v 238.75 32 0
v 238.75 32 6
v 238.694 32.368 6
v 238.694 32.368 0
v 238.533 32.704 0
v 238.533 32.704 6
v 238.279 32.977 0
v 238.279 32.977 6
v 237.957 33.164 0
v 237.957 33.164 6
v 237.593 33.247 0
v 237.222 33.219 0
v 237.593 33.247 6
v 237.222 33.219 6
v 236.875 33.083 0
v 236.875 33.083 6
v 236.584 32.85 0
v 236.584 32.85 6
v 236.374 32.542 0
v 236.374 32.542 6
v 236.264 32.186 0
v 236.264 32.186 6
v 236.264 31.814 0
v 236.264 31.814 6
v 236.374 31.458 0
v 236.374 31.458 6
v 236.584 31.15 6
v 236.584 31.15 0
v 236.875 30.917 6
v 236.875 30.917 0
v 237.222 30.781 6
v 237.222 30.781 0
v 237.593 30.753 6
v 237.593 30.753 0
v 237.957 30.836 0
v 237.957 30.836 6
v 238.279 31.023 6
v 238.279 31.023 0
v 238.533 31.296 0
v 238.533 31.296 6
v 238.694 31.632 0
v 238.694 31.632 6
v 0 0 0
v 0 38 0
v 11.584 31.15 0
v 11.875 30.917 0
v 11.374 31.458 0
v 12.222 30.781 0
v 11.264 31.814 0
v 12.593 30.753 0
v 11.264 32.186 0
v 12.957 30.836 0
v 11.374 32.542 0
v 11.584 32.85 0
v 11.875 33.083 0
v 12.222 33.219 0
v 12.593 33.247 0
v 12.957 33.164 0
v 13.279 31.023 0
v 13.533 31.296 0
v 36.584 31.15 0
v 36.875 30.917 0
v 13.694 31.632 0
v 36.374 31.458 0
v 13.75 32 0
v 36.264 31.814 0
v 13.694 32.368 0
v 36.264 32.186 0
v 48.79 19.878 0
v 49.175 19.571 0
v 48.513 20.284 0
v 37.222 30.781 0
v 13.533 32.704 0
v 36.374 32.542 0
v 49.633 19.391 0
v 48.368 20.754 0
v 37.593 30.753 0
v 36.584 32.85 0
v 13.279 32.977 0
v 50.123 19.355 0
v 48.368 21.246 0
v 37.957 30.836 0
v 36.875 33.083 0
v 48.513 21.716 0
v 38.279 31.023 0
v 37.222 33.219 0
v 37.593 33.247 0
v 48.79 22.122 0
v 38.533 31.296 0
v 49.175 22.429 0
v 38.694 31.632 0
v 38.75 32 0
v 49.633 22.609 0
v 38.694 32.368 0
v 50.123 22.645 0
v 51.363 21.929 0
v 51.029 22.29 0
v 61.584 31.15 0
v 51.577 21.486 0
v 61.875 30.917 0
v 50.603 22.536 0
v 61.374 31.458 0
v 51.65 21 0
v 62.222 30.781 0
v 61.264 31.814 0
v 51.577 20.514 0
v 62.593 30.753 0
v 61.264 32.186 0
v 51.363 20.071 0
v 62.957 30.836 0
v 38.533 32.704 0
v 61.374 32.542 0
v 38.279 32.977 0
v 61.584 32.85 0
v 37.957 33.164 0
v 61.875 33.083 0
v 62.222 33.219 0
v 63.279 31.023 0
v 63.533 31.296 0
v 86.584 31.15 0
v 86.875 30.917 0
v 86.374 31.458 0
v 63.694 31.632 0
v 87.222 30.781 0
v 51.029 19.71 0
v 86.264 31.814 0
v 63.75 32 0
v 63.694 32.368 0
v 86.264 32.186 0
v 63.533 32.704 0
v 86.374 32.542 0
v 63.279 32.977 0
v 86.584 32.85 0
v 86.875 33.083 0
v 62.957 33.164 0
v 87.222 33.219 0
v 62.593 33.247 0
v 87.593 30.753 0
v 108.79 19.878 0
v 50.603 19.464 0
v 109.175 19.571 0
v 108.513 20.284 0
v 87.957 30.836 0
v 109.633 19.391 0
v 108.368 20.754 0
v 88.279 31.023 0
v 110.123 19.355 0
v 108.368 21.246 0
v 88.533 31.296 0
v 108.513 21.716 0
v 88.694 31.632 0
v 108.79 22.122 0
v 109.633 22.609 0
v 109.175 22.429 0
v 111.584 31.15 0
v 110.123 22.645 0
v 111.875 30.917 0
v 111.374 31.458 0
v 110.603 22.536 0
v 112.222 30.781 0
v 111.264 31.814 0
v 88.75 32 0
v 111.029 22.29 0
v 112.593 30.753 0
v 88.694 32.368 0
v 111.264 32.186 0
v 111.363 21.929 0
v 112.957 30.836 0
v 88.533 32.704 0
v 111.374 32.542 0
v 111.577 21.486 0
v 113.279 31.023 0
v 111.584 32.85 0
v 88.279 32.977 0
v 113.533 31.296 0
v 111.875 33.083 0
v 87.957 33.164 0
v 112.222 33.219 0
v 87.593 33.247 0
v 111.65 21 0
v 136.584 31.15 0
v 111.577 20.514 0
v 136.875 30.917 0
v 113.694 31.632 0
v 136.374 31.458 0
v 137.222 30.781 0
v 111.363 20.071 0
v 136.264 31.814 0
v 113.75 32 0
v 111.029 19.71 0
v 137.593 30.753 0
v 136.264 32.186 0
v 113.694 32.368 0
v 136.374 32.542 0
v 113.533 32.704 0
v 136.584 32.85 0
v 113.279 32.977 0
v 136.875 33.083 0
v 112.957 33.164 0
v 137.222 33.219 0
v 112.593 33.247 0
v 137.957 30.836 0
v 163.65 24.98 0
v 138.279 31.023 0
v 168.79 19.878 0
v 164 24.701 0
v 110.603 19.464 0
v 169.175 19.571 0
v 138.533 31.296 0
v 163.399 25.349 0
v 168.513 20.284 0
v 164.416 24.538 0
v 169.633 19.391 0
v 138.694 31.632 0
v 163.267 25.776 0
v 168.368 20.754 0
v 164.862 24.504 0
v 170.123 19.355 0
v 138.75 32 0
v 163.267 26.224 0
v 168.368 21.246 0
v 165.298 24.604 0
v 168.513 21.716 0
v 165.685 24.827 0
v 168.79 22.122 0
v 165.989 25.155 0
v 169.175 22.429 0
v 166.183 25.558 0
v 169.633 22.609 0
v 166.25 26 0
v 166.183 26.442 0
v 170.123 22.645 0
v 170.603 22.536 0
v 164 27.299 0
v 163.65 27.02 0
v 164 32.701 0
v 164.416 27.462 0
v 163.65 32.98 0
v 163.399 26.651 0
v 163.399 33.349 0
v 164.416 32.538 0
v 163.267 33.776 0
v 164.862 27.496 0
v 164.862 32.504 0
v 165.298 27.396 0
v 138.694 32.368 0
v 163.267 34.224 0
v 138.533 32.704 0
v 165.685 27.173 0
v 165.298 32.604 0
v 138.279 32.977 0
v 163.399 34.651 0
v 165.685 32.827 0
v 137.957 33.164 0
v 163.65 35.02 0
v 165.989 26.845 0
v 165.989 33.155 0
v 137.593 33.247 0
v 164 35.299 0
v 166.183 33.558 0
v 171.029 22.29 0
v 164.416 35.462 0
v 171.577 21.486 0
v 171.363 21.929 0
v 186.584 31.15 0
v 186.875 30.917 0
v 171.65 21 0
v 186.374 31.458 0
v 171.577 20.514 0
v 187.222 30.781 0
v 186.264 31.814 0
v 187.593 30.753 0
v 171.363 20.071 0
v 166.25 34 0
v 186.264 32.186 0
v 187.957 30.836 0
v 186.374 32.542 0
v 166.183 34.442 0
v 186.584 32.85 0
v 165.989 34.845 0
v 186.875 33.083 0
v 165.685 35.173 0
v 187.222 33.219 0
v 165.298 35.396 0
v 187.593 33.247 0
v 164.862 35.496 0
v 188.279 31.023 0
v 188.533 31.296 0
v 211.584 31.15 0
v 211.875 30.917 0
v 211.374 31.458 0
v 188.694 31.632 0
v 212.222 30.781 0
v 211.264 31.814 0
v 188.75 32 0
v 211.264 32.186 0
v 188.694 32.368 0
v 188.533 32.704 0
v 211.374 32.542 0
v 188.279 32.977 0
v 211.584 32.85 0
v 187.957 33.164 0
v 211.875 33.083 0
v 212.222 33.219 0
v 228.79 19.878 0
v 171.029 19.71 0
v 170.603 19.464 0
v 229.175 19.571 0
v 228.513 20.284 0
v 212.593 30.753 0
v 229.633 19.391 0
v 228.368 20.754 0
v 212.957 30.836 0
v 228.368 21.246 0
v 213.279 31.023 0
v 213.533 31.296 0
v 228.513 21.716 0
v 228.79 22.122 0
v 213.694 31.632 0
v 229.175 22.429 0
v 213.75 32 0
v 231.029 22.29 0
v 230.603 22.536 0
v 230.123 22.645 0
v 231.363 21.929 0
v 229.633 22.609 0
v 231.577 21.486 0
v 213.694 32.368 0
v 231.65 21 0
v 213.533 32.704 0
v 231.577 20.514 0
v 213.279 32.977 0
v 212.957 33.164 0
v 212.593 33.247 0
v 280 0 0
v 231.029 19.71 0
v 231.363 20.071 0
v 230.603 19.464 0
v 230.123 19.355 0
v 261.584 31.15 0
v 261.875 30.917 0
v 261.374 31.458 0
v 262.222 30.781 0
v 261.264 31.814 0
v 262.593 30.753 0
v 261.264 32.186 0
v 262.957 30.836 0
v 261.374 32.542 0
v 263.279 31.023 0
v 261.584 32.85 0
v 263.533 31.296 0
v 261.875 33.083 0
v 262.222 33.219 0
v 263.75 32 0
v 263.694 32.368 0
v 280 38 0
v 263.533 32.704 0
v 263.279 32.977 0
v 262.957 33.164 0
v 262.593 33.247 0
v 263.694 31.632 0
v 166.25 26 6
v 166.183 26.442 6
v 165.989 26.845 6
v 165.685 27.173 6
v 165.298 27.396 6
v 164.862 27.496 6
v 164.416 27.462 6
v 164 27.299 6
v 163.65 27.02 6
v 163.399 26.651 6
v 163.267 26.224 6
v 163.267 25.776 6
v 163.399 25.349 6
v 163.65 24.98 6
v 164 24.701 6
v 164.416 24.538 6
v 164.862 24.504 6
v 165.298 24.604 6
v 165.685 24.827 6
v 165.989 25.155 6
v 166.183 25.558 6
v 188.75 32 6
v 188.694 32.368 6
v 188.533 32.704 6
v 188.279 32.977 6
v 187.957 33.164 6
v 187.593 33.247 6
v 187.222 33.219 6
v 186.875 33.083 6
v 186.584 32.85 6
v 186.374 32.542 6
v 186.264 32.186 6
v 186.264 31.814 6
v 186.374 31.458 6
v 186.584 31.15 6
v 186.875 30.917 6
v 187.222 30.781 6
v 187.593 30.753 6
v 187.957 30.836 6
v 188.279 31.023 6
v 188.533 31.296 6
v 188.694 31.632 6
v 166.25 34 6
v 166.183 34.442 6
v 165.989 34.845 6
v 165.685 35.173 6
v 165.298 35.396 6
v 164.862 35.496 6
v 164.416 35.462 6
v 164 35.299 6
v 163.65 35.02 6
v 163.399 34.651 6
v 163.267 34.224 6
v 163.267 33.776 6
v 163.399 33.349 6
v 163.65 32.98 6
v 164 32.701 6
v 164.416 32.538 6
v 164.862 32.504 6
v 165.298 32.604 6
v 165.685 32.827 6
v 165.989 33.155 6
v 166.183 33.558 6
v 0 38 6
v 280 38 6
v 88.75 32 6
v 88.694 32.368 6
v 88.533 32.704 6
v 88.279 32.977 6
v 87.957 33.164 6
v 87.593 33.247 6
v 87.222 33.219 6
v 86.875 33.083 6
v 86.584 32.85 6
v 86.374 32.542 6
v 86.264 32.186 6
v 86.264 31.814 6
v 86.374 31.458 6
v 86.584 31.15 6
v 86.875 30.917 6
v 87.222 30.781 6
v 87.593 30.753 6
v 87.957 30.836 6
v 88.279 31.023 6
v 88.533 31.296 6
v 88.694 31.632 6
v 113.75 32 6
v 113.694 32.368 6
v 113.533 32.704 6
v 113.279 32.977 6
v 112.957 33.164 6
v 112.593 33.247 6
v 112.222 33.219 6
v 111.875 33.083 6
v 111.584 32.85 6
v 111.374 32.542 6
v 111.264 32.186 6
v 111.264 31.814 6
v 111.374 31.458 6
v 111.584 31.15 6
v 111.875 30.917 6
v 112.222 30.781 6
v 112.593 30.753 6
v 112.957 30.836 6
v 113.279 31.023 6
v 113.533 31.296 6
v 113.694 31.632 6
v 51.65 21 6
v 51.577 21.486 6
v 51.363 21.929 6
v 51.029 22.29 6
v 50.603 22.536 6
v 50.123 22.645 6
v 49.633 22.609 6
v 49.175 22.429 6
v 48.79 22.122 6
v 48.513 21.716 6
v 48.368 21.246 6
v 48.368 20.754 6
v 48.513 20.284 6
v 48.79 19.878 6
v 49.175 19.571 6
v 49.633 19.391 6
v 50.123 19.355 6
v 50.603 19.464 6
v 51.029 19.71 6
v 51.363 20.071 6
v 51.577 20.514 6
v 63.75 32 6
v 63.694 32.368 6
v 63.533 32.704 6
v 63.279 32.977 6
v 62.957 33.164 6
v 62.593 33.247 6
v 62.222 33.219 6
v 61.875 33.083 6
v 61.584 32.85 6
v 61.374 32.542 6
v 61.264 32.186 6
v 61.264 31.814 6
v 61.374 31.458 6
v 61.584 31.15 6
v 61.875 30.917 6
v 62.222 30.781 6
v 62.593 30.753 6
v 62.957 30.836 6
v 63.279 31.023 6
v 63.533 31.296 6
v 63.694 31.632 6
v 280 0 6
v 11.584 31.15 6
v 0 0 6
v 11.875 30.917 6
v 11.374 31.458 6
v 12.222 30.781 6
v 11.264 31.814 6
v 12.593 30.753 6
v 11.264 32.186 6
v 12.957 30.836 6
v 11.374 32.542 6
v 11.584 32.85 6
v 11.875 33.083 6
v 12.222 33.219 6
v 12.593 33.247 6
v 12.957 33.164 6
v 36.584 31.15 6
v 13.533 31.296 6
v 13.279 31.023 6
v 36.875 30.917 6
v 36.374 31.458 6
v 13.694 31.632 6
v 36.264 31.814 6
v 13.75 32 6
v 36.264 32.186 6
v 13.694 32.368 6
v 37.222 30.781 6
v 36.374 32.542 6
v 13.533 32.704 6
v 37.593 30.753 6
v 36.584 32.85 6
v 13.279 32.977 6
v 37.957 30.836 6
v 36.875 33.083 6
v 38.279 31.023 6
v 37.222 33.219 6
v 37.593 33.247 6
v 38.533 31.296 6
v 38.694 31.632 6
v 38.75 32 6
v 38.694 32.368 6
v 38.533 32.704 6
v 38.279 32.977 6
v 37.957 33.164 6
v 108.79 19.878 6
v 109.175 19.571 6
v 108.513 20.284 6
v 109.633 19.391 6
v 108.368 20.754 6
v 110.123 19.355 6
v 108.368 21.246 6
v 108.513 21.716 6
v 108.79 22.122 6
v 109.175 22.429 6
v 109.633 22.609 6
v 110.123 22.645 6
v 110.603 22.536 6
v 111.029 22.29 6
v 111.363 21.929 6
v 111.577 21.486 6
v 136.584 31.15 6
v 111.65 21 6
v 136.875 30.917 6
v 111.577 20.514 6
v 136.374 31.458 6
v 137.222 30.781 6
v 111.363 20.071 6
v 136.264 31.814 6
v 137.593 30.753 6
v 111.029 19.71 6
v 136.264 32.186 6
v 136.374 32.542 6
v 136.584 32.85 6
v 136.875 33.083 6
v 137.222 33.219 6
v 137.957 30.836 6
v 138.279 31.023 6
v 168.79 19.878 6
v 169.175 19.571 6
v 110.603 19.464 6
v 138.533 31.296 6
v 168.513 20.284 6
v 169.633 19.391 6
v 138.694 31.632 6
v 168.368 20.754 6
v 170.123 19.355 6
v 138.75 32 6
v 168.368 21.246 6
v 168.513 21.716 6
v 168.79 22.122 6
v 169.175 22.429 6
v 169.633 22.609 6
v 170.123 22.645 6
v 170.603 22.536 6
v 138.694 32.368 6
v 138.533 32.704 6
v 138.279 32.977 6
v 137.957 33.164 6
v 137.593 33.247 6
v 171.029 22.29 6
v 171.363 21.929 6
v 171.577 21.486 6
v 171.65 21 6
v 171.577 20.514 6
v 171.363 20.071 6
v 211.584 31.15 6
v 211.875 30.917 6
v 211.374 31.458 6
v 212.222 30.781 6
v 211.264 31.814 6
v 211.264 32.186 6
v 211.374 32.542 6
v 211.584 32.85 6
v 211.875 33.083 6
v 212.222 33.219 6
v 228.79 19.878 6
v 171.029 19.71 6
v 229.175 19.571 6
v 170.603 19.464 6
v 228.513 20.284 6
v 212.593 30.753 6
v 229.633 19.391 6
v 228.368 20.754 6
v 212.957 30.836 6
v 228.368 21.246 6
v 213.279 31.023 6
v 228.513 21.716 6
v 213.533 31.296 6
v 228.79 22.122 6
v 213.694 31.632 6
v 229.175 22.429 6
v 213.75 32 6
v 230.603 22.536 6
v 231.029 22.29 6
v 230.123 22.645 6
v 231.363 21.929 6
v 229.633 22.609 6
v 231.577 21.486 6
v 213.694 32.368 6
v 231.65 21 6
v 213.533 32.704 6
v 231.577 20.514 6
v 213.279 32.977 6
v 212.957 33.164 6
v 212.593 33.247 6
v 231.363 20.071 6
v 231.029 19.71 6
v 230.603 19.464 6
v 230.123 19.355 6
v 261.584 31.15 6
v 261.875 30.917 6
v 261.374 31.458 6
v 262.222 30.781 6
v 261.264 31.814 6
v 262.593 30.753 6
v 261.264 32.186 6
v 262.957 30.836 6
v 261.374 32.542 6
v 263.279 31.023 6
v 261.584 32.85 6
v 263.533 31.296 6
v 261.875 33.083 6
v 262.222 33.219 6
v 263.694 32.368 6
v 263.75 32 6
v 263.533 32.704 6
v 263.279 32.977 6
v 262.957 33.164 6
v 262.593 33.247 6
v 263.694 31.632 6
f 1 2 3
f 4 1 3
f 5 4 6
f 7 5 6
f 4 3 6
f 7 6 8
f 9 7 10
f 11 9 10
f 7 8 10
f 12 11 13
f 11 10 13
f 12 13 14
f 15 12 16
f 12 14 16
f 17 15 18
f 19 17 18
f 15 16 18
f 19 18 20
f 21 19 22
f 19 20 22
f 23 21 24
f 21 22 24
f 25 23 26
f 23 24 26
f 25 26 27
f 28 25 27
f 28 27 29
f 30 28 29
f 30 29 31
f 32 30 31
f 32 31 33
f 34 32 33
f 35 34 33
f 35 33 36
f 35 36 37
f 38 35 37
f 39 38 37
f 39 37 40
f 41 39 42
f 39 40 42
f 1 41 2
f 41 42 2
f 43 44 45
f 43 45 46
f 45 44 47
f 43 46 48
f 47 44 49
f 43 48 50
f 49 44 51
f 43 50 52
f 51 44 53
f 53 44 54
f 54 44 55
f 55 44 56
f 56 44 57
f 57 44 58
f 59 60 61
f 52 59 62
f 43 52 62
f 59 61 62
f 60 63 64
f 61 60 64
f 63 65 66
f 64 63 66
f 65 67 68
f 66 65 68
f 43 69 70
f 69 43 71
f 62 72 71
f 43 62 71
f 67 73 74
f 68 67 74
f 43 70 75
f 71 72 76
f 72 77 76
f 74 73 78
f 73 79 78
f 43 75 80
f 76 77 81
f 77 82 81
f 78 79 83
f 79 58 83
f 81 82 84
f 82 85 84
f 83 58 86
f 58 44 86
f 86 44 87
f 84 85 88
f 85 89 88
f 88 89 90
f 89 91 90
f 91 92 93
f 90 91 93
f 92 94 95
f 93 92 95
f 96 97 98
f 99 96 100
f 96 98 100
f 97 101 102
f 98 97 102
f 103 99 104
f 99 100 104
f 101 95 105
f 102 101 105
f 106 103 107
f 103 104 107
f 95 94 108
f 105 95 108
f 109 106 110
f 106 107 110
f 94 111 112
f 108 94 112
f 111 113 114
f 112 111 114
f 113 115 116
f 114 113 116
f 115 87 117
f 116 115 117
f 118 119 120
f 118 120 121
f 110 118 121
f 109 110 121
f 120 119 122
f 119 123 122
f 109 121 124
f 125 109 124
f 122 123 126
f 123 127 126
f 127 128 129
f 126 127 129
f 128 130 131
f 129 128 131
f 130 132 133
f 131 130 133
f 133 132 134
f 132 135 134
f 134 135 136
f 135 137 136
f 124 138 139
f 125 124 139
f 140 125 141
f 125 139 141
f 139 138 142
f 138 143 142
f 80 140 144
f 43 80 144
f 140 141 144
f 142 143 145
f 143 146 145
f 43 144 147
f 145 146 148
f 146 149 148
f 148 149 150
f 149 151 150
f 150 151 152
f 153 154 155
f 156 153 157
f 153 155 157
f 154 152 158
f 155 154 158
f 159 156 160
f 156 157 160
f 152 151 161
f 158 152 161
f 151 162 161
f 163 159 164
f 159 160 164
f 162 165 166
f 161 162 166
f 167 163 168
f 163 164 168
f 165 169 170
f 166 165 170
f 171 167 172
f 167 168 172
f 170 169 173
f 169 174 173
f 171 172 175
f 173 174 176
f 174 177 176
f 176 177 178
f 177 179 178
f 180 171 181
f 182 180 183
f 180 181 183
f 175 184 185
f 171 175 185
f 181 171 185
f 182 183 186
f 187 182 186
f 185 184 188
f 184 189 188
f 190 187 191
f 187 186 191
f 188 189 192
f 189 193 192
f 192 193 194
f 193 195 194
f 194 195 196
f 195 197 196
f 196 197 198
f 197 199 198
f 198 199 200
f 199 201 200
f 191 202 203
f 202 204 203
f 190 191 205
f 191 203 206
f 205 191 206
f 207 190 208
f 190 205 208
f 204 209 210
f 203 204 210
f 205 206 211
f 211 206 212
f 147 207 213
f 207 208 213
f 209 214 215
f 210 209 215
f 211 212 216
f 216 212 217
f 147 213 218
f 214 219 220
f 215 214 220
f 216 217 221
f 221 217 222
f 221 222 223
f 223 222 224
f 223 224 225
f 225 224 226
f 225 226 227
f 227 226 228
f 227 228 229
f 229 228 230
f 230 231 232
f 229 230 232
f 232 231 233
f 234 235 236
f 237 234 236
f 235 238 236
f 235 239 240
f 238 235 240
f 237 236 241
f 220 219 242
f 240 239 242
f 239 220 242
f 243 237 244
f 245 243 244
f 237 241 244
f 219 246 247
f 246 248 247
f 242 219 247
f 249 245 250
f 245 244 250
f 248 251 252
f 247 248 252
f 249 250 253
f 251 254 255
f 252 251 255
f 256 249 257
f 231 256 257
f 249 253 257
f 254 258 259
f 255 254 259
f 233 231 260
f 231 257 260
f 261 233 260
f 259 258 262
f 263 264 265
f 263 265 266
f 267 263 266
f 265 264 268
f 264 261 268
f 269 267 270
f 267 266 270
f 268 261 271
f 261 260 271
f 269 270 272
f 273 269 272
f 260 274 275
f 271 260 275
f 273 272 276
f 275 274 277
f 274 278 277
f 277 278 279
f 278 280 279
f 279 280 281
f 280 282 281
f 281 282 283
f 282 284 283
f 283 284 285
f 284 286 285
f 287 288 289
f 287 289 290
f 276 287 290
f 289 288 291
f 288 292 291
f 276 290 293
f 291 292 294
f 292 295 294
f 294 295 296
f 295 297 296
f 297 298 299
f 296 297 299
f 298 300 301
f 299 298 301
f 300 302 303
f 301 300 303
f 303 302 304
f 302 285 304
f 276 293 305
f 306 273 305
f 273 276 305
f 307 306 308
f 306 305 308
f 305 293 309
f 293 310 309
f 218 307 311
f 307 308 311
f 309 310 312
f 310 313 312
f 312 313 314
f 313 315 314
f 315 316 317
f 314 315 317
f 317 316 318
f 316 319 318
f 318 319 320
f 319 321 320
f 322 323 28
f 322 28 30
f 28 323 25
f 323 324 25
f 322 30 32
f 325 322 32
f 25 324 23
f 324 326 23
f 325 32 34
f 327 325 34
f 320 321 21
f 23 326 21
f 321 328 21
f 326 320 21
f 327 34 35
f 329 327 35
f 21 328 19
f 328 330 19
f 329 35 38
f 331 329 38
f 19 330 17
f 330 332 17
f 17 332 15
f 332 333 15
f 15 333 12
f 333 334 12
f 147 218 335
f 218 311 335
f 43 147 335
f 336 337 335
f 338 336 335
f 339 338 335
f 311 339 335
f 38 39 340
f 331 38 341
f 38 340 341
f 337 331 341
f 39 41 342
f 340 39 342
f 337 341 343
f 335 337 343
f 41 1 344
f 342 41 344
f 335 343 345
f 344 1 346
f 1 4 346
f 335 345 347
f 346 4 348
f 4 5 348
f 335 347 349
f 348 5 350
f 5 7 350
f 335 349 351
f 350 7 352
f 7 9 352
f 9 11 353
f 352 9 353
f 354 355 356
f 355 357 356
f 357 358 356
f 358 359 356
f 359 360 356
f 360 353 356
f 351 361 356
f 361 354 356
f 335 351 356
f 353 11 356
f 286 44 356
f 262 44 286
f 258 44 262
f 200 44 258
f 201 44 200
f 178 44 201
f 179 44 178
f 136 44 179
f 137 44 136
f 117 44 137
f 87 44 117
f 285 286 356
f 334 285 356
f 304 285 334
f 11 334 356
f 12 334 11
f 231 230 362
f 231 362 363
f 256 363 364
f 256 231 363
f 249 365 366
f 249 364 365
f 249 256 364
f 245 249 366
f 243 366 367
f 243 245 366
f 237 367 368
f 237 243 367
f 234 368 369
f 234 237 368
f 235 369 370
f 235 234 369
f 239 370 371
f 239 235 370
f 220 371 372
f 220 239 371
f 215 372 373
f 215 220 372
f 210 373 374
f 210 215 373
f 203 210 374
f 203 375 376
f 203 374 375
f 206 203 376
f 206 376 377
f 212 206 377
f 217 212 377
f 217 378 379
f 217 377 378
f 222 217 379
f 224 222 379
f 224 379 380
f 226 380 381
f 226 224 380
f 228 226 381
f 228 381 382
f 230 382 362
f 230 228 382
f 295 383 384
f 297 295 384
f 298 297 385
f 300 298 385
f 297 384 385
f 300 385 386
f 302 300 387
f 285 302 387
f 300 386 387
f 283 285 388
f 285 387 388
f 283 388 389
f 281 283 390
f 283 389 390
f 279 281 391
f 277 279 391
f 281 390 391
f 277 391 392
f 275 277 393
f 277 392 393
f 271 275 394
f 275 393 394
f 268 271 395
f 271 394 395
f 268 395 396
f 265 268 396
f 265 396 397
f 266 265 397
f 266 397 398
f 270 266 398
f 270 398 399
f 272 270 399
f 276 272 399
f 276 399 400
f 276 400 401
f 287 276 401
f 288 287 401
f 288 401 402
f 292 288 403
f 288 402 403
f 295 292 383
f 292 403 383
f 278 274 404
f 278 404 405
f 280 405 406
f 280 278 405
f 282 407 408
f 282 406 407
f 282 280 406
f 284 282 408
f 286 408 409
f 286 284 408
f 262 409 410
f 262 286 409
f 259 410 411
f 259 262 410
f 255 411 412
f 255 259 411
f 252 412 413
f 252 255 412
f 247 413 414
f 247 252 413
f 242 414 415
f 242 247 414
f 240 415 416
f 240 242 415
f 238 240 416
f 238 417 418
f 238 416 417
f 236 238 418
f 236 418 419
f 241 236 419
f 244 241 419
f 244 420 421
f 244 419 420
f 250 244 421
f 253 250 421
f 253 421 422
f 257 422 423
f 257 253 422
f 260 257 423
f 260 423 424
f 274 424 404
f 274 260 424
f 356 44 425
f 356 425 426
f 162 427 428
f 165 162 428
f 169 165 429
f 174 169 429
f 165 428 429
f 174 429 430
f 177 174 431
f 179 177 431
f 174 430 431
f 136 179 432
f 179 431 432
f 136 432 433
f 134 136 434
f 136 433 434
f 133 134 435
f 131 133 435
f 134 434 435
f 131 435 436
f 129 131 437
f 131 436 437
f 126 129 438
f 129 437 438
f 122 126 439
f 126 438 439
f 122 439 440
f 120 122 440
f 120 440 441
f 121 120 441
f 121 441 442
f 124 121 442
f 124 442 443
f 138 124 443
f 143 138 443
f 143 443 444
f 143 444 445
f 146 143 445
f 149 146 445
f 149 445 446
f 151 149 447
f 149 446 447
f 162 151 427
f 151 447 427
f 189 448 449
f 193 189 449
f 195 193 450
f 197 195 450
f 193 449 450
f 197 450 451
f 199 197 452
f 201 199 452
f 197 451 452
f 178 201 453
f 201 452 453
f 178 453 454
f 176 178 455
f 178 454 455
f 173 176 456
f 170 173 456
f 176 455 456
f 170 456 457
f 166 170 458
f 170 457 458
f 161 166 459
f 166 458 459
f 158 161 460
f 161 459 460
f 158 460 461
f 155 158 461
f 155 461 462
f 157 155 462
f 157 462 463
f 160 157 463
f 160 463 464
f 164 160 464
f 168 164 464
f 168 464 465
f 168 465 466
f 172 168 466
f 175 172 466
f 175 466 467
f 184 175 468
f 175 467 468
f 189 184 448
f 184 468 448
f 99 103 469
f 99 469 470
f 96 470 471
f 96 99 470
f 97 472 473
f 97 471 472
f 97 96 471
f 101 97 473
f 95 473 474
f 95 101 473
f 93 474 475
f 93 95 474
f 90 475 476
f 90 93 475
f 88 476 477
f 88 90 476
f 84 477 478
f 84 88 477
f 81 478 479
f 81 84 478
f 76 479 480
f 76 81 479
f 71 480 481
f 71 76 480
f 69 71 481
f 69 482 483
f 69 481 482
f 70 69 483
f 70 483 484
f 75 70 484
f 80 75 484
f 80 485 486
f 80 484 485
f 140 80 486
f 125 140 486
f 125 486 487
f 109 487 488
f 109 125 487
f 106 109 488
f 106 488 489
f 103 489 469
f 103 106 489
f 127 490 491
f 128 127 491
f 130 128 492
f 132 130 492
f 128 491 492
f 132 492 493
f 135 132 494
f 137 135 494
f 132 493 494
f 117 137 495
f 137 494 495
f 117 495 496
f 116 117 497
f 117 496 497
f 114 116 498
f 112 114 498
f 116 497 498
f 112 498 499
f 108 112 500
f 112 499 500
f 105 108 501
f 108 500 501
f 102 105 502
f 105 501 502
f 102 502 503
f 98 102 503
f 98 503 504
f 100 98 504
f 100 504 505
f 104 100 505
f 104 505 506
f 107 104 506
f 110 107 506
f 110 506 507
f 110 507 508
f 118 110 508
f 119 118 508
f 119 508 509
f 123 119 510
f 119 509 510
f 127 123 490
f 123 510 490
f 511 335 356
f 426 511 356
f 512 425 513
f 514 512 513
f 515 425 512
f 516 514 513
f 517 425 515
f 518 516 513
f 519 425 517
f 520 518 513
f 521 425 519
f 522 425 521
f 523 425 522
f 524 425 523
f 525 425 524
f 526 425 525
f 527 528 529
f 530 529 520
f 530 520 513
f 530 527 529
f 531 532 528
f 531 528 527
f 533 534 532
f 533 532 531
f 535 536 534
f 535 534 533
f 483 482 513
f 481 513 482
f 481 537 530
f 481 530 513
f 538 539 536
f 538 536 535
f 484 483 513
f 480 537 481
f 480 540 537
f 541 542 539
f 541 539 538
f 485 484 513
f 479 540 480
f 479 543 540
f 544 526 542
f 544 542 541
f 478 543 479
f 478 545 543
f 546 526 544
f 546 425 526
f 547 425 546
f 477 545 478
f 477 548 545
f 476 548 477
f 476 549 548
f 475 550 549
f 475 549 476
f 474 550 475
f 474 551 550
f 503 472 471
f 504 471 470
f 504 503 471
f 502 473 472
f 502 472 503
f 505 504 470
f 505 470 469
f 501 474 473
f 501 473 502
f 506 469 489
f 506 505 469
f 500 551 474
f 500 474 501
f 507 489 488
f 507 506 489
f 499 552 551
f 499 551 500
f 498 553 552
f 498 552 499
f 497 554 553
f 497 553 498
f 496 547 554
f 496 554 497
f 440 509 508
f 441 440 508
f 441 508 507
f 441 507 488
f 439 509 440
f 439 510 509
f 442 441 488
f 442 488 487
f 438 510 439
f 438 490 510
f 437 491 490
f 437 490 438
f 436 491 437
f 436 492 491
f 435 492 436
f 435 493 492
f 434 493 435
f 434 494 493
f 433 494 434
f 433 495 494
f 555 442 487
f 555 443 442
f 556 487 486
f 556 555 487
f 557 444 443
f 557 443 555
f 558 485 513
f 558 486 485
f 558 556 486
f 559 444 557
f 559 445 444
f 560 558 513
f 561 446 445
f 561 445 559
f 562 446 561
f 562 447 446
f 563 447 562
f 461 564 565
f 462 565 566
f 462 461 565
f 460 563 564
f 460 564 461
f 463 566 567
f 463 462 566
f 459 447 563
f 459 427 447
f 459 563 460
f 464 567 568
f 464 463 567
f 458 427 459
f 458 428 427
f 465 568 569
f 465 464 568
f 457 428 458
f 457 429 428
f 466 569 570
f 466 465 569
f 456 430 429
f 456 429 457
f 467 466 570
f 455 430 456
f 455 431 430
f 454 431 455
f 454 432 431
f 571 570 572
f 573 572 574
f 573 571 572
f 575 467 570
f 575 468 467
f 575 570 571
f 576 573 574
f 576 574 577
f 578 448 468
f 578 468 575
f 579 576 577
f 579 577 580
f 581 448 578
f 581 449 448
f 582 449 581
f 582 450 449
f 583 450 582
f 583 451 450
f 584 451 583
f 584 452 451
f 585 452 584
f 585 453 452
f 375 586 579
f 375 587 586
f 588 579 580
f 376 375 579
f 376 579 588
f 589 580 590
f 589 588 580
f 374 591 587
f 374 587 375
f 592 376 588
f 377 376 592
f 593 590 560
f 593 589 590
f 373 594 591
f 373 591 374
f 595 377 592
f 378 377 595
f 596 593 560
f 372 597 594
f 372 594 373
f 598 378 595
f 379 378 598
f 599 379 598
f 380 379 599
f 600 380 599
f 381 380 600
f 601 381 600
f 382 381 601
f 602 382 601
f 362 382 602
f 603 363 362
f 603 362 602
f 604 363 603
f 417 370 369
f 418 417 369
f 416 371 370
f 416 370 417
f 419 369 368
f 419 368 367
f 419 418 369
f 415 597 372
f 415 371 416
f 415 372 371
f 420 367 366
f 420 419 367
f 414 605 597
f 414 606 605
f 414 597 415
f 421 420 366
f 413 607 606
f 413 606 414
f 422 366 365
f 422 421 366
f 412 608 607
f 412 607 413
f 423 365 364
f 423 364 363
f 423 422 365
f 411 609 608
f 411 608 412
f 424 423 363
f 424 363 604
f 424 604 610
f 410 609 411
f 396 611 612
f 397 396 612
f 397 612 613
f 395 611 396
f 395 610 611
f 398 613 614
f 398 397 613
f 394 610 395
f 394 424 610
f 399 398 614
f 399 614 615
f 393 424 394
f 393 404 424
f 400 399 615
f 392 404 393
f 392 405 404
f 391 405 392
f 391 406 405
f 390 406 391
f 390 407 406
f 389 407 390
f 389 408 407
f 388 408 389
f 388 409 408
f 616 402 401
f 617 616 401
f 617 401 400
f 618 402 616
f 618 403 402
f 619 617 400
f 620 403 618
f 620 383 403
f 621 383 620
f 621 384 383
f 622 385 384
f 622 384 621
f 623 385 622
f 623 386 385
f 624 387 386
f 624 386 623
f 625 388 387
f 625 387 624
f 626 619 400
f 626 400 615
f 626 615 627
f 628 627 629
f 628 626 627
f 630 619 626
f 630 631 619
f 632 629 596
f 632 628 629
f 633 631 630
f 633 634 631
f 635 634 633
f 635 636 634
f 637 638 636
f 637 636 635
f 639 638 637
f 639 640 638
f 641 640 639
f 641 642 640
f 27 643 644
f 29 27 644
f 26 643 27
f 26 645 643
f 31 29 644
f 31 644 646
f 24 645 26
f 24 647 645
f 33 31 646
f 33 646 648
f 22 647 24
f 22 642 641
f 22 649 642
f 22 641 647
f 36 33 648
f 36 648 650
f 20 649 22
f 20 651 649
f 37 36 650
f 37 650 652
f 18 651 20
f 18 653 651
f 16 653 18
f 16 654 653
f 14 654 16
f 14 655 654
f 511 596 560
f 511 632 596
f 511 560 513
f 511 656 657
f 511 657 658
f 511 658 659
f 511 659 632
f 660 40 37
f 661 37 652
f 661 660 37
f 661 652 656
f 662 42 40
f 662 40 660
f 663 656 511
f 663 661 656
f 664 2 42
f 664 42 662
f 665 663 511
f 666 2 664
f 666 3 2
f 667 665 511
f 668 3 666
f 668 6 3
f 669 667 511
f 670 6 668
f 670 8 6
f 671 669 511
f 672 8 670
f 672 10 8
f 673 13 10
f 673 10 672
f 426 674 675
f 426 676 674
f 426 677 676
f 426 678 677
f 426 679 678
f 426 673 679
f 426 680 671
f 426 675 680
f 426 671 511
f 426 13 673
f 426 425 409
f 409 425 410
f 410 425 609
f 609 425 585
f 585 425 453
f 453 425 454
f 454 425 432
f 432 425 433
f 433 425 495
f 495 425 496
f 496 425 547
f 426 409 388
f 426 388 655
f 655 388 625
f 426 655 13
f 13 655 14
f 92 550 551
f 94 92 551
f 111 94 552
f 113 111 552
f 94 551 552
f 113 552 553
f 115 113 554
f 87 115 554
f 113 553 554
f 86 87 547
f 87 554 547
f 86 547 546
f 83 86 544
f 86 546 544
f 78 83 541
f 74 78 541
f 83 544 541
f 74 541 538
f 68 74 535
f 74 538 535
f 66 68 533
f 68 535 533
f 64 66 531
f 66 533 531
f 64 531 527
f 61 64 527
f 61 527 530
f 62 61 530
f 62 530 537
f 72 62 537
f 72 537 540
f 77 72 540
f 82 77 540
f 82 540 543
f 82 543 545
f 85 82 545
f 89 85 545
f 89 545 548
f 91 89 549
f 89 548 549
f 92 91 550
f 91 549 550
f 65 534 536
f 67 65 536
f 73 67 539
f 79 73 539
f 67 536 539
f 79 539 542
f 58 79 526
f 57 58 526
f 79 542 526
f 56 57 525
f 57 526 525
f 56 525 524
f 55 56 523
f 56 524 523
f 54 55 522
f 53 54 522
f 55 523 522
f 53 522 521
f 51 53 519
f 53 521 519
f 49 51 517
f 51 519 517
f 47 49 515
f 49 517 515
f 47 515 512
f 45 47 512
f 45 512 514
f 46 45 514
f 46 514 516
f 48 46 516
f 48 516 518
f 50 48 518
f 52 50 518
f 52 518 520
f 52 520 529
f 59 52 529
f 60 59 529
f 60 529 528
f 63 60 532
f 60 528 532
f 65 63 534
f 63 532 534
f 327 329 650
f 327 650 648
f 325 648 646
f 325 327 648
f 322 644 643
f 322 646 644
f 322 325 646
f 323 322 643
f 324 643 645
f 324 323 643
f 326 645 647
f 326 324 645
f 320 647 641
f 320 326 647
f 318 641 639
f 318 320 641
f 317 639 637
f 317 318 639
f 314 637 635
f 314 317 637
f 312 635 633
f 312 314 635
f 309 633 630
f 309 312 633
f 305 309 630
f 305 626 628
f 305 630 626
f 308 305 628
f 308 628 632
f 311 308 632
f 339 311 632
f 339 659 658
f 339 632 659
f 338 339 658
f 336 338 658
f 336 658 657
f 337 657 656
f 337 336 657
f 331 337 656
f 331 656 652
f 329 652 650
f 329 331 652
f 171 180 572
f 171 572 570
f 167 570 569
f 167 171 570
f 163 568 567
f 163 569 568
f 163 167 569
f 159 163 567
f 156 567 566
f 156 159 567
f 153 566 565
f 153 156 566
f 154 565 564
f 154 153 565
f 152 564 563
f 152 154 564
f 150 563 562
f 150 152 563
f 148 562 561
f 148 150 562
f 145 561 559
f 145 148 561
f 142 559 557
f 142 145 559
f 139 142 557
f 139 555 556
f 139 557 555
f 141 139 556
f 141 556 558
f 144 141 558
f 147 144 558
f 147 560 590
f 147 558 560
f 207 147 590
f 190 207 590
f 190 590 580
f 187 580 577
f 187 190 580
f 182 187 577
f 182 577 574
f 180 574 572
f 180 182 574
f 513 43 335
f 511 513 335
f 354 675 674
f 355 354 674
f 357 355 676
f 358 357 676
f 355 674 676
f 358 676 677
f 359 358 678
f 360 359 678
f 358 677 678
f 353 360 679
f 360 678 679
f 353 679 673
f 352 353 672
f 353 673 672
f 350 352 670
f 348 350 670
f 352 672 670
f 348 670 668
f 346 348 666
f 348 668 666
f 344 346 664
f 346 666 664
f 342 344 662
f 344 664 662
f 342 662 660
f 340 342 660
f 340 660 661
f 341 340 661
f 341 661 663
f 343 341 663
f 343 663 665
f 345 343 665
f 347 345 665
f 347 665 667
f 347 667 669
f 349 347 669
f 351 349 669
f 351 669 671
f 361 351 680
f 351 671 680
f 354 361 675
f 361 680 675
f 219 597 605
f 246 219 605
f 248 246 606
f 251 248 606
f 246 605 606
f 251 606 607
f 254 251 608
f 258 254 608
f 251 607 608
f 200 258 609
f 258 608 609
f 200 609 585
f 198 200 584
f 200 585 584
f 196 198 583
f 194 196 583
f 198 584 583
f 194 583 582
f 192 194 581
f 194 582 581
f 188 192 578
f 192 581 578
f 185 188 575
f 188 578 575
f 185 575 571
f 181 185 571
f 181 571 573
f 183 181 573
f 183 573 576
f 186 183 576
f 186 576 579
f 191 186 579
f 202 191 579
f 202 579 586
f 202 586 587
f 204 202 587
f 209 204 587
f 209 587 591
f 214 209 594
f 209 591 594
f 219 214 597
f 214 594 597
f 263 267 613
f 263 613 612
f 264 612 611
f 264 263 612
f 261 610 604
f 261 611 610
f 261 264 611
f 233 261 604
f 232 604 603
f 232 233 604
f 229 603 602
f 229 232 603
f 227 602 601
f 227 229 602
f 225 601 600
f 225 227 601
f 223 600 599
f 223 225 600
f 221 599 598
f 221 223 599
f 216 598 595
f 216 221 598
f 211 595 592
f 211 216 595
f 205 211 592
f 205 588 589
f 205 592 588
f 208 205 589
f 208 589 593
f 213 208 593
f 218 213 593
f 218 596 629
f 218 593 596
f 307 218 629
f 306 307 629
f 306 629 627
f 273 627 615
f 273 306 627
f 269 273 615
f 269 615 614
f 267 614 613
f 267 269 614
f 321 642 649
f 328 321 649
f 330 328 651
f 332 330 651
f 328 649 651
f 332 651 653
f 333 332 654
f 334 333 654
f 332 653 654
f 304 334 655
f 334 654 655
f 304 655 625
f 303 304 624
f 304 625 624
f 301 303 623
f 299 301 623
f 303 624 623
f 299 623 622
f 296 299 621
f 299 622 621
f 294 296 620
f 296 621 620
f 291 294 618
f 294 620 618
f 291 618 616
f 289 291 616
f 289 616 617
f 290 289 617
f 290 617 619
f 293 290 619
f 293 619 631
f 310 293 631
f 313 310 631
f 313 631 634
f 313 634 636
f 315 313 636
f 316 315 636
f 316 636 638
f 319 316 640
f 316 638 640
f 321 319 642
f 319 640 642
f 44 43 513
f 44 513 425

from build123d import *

# Parameters (mm, degrees)
ESQUISSE1_W                  = 280
ESQUISSE1_H                  = 38
BOSS_EXTRU_1_DEPTH           = 6
ESQUISSE2_R                  = 1.25
ENL_V_MAT_EXTRU_1_DEPTH      = 6
ESQUISSE5_R                  = 1.25
BOSS_EXTRU_2_DEPTH           = 6
ENL_V_MAT_EXTRU_2_DEPTH      = 283.630500831
ENL_V_MAT_EXTRU_2_DEPTH_BACK = 283.630500831
ESQUISSE3_R                  = 1.65
ENL_V_MAT_EXTRU_3_DEPTH      = 283.630500831
ENL_V_MAT_EXTRU_3_DEPTH_BACK = 283.630500831
ESQUISSE4_R                  = 1.5


with BuildPart() as part:
    # Esquisse1 → Boss.-Extru.1 (new body)
    with BuildSketch(Plane.XY):
        with Locations((140, 19)):
            Rectangle(ESQUISSE1_W, ESQUISSE1_H)
    extrude(amount=BOSS_EXTRU_1_DEPTH)

    # Esquisse2 → Enlèv. mat.-Extru.1 (cut)
    with BuildSketch(Plane.XY.offset(6)):
        with Locations((12.5, 32)):
            Circle(ESQUISSE2_R)
        with Locations((37.5, 32)):
            Circle(ESQUISSE2_R)
        with Locations((62.5, 32)):
            Circle(ESQUISSE2_R)
        with Locations((87.5, 32)):
            Circle(ESQUISSE2_R)
        with Locations((112.5, 32)):
            Circle(ESQUISSE2_R)
        with Locations((137.5, 32)):
            Circle(ESQUISSE2_R)
        with Locations((162.5, 32)):
            Circle(ESQUISSE2_R)
        with Locations((187.5, 32)):
            Circle(ESQUISSE2_R)
        with Locations((212.5, 32)):
            Circle(ESQUISSE2_R)
        with Locations((237.5, 32)):
            Circle(ESQUISSE2_R)
        with Locations((262.5, 32)):
            Circle(ESQUISSE2_R)
    extrude(amount=-ENL_V_MAT_EXTRU_1_DEPTH, mode=Mode.SUBTRACT)

    # Esquisse5 → Boss.-Extru.2 (add)
    with BuildSketch(Plane.XY.offset(6)):
        with Locations((162.5, 32)):
            Circle(ESQUISSE5_R)
    extrude(amount=-BOSS_EXTRU_2_DEPTH)

    # Esquisse3 → Enlèv. mat.-Extru.2 (cut, two sides: drawn at the far end of the back side and taken through both)
    with BuildSketch(Plane.XY.offset(6).offset(-ENL_V_MAT_EXTRU_2_DEPTH_BACK)):
        with Locations((50, 21)):
            Circle(ESQUISSE3_R)
        with Locations((110, 21)):
            Circle(ESQUISSE3_R)
        with Locations((170, 21)):
            Circle(ESQUISSE3_R)
        with Locations((230, 21)):
            Circle(ESQUISSE3_R)
    extrude(amount=ENL_V_MAT_EXTRU_2_DEPTH + ENL_V_MAT_EXTRU_2_DEPTH_BACK, mode=Mode.SUBTRACT)

    # Esquisse4 → Enlèv. mat.-Extru.3 (cut, two sides: drawn at the far end of the back side and taken through both)
    with BuildSketch(Plane.XY.offset(6).offset(-ENL_V_MAT_EXTRU_3_DEPTH_BACK)):
        with Locations((164.75, 34)):
            Circle(ESQUISSE4_R)
        with Locations((164.75, 26)):
            Circle(ESQUISSE4_R)
    extrude(amount=ENL_V_MAT_EXTRU_3_DEPTH + ENL_V_MAT_EXTRU_3_DEPTH_BACK, mode=Mode.SUBTRACT)


solid = part.part
